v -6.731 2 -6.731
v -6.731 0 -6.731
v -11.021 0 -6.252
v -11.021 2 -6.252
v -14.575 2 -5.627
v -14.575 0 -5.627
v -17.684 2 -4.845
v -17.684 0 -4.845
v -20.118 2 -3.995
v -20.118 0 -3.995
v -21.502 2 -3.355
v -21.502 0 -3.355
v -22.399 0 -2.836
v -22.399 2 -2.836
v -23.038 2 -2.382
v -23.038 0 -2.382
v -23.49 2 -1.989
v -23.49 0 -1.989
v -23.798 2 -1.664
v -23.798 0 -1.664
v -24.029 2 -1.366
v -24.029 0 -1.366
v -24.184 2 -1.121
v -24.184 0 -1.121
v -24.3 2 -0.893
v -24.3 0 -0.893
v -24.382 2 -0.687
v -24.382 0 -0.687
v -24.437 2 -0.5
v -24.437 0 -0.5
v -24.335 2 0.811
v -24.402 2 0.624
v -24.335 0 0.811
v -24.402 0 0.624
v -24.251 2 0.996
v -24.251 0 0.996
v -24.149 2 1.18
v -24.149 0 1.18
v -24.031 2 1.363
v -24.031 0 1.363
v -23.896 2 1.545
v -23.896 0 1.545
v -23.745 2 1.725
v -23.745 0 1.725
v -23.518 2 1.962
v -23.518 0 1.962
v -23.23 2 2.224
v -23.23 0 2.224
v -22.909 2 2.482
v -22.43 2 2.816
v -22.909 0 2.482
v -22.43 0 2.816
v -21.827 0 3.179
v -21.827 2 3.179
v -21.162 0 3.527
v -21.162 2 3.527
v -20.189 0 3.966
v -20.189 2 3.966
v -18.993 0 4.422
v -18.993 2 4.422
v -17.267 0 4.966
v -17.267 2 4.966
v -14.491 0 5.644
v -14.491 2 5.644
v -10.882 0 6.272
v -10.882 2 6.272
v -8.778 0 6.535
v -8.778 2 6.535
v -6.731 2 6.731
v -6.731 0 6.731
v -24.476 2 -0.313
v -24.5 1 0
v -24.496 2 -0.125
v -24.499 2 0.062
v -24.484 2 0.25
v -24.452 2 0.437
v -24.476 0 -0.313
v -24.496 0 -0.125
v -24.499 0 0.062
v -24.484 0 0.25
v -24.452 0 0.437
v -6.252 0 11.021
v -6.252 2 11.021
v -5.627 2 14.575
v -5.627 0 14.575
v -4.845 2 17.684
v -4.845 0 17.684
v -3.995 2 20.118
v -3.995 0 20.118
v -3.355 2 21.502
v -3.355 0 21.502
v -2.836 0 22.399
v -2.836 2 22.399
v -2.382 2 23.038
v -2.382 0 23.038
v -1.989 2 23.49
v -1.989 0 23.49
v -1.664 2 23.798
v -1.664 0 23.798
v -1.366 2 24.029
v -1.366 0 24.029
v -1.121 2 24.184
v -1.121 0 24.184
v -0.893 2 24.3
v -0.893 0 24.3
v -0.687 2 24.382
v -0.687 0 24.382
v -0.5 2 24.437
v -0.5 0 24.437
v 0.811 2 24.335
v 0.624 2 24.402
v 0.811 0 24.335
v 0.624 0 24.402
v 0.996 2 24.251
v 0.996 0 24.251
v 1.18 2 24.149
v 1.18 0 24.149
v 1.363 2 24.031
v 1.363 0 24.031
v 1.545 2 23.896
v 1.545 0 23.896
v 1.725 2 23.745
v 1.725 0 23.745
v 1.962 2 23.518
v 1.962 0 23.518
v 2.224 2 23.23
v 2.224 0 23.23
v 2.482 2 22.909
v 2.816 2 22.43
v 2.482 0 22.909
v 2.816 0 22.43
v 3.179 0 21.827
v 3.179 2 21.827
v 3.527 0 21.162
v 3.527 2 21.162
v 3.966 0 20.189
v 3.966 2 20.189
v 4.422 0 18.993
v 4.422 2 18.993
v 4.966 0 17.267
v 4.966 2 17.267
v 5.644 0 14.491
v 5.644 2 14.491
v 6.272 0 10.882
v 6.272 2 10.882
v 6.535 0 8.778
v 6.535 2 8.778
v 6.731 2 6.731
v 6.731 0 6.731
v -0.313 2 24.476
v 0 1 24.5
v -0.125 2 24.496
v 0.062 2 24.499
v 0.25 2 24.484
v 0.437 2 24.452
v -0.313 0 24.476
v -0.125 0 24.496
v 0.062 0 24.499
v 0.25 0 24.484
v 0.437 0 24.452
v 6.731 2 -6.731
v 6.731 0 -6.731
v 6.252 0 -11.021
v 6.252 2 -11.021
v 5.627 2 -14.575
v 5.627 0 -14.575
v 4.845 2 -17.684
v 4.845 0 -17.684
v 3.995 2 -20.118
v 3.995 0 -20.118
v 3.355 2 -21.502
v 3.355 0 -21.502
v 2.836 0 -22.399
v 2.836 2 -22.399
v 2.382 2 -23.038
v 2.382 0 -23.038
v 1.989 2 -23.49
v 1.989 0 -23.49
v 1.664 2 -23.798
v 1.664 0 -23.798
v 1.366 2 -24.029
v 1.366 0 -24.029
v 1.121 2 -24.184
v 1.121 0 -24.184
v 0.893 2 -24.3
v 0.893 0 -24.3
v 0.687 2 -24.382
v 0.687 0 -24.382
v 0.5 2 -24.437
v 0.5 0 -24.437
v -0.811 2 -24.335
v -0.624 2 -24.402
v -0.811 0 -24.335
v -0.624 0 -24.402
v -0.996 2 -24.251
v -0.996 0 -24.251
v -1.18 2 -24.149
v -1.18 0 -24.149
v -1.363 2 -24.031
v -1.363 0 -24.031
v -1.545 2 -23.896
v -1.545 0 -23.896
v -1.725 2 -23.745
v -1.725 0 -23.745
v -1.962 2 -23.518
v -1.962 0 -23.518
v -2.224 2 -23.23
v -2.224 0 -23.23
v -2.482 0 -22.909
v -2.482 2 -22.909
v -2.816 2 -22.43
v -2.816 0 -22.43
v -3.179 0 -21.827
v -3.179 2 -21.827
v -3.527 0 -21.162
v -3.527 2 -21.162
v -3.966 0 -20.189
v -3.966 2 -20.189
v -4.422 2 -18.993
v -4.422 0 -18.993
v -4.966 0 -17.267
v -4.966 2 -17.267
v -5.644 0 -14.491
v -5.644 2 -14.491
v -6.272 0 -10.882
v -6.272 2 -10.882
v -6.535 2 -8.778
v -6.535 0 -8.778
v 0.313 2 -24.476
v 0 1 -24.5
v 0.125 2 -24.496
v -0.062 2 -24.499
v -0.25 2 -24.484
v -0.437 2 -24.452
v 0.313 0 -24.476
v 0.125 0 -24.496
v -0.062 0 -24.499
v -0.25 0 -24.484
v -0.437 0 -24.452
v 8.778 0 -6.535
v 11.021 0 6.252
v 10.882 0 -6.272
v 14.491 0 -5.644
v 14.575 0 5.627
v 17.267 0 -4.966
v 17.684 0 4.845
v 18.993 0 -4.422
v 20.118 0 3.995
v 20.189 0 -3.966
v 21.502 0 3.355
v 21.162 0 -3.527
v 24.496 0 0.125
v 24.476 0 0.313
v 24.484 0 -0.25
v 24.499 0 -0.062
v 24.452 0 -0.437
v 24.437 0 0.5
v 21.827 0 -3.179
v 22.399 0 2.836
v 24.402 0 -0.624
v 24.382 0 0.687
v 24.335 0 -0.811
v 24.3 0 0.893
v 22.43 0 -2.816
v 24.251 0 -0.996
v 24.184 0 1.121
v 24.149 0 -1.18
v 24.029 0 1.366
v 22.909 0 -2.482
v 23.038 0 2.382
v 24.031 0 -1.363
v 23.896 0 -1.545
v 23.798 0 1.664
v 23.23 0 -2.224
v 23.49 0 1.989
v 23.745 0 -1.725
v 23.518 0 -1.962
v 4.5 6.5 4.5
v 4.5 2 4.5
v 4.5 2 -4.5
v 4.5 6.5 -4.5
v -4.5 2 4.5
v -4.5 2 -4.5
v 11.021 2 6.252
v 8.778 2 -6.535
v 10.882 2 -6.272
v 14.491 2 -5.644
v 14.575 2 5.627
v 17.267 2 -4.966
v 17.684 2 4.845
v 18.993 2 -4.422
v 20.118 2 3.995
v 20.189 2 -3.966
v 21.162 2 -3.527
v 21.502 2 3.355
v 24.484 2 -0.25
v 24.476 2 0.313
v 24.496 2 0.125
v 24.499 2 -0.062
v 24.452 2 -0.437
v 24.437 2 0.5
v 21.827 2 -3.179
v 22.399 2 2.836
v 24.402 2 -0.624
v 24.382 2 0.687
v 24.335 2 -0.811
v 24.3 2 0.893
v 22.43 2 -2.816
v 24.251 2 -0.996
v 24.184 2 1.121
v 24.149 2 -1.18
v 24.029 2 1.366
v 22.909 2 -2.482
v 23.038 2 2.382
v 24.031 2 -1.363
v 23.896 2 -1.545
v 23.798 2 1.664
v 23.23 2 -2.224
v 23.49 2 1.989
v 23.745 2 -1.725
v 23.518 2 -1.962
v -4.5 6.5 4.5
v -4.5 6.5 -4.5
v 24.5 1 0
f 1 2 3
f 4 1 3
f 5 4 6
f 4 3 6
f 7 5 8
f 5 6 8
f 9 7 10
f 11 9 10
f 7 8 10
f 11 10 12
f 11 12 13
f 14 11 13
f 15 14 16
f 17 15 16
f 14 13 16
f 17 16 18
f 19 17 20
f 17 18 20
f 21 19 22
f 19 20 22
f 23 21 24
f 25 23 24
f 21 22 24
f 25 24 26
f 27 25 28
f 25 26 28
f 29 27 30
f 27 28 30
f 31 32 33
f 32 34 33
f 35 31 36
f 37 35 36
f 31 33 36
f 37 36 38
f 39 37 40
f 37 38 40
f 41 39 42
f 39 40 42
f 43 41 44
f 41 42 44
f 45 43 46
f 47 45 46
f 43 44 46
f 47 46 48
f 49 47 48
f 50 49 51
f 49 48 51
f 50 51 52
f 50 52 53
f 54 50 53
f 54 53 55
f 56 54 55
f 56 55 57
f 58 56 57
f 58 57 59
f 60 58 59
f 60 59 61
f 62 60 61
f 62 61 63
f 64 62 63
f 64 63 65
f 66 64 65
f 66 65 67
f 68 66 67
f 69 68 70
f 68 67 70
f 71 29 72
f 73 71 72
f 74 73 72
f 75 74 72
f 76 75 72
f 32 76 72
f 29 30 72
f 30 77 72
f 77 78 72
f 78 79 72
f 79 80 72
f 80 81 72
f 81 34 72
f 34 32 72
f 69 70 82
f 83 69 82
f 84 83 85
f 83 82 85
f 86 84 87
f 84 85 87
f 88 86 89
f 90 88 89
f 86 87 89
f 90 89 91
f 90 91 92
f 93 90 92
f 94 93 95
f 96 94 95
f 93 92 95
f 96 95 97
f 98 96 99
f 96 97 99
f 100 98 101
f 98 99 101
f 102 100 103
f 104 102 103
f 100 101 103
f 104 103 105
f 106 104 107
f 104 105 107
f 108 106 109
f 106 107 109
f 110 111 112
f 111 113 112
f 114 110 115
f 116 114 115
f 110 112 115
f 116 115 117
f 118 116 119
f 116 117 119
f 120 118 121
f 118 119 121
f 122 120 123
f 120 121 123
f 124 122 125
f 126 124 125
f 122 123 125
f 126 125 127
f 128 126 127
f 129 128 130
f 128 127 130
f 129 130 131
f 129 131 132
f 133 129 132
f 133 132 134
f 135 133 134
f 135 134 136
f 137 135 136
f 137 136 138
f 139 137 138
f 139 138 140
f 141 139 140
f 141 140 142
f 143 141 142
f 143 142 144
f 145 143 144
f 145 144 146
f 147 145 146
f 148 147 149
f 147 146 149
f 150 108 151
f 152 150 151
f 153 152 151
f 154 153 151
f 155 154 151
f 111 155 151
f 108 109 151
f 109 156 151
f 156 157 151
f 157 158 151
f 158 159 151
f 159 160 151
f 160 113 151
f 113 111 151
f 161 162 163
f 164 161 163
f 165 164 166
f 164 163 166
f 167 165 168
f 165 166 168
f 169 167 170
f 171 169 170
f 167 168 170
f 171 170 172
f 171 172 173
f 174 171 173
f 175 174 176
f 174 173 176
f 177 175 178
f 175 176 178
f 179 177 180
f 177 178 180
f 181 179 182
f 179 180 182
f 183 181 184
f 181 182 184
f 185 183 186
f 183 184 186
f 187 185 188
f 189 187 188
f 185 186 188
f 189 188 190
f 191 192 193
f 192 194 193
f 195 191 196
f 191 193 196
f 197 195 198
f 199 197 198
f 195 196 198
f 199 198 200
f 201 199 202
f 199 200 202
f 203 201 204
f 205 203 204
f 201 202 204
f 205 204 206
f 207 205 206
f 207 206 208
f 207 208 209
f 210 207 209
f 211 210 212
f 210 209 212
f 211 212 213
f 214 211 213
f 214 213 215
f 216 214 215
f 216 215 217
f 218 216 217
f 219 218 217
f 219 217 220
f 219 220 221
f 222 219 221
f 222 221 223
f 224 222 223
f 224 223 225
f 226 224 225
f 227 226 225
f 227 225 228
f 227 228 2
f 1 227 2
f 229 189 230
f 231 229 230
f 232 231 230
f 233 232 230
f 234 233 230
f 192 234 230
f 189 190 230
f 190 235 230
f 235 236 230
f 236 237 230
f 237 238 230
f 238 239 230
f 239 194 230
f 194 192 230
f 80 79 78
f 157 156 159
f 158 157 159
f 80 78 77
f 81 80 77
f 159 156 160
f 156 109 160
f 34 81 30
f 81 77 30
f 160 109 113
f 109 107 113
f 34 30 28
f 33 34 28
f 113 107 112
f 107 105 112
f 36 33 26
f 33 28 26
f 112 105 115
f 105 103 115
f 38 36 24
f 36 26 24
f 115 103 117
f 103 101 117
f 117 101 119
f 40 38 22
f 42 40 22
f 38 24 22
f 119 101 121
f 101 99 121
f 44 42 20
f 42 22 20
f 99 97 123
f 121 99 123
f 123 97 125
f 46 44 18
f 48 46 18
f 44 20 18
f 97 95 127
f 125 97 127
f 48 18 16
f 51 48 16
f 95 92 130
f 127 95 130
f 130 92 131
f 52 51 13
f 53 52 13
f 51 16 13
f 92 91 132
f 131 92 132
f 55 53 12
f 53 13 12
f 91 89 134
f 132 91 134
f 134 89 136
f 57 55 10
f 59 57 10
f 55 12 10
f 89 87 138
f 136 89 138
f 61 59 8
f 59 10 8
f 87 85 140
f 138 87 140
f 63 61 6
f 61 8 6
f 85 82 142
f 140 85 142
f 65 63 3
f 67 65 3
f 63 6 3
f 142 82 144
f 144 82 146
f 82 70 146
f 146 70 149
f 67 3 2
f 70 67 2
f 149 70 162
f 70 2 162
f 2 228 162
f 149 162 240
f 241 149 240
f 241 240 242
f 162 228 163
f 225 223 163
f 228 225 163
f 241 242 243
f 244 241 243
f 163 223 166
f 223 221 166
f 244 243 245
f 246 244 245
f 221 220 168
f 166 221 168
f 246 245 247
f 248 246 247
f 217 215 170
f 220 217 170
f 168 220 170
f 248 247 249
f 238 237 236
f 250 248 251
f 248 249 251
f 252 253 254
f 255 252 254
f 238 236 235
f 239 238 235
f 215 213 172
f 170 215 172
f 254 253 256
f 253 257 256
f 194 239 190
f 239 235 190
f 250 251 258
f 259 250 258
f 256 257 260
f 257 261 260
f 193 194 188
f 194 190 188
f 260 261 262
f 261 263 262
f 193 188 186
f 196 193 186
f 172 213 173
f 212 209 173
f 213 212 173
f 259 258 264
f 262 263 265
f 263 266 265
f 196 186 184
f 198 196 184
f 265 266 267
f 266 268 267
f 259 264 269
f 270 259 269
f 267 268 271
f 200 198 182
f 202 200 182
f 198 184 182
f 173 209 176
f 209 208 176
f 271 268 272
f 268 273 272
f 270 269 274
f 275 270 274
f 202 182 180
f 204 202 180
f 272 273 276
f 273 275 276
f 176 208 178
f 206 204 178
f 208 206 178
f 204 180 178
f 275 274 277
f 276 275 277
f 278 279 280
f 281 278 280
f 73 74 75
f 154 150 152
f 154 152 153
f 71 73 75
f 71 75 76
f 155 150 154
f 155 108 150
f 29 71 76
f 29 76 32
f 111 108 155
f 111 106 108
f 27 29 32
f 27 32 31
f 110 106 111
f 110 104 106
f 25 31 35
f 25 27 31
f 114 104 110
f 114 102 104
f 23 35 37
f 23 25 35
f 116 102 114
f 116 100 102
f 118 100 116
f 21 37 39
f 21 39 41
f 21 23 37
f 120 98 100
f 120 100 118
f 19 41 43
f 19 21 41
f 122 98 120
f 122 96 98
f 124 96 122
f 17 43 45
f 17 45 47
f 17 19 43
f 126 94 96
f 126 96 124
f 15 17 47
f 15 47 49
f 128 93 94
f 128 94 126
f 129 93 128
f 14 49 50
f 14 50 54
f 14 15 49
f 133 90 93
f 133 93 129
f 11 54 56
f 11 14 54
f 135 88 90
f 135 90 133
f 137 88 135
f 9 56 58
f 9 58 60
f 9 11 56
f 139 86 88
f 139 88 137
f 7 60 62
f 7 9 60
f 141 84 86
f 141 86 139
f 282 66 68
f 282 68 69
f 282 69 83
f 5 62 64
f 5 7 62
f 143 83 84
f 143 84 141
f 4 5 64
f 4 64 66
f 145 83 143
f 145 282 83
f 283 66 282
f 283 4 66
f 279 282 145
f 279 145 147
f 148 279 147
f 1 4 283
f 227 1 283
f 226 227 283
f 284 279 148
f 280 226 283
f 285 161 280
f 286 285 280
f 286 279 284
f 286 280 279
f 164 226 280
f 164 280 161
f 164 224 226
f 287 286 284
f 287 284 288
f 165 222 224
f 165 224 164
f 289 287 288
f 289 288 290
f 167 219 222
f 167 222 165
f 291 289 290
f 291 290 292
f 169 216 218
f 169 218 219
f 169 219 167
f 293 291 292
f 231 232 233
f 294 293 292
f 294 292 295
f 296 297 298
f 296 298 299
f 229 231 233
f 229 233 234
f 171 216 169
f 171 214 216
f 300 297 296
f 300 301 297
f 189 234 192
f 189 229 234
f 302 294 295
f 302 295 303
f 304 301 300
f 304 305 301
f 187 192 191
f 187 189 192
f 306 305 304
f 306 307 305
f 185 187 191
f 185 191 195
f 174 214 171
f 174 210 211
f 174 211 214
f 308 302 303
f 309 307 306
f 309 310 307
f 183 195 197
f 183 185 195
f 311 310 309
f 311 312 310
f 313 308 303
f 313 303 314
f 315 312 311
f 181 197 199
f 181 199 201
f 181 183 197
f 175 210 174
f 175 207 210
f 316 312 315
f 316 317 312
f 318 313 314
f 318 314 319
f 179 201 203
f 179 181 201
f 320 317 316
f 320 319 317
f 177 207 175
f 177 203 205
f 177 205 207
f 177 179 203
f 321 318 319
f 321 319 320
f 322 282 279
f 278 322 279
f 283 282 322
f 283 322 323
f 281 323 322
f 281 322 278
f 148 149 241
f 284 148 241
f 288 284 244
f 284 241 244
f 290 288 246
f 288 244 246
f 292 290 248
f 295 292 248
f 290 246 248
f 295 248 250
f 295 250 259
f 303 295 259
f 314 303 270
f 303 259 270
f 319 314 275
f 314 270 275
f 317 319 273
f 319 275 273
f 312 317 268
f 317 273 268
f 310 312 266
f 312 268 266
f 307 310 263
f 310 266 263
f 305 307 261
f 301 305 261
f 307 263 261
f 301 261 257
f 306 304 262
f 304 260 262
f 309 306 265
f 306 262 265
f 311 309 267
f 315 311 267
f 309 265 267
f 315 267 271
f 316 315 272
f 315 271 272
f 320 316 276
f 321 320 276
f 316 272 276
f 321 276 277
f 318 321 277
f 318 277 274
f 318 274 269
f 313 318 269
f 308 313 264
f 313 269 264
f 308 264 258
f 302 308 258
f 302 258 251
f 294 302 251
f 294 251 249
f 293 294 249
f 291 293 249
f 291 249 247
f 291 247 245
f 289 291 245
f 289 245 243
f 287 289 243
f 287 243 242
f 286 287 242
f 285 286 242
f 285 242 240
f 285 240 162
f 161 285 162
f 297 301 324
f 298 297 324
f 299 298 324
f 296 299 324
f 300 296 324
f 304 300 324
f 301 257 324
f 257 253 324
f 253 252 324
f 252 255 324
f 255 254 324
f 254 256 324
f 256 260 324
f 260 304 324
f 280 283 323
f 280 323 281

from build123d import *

# Parameters (mm, degrees)
BOSS_EXTRUDE1_DEPTH = 2
SKETCH2_W           = 9
SKETCH2_H           = 9
BOSS_EXTRUDE2_DEPTH = 4.5


with BuildPart() as part:
    # Sketch1 → Boss-Extrude1 (new body)
    with BuildSketch(Plane(origin=(0, 0, 0), x_dir=(1, 0, 0), z_dir=(0, 1, 0))):
        with BuildLine():
            add(Edge.make_bspline(
                [(-6.730667633, 6.730667633), (-89.181346144, 0), (-6.730667633, -6.730667633)],
                knots=[4.990688639, 4.990688639, 4.990688639, 7.575681975, 7.575681975, 7.575681975], degree=2, weights=[1, 0.274721128, 1]))
            add(Edge.make_bspline(
                [(-6.730667633, -6.730667633), (0, -89.181346144), (6.730667633, -6.730667633)],
                knots=[4.990688639, 4.990688639, 4.990688639, 7.575681975, 7.575681975, 7.575681975], degree=2, weights=[1, 0.274721128, 1]))
            add(Edge.make_bspline(
                [(6.730667633, -6.730667633), (89.181346144, 0), (6.730667633, 6.730667633)],
                knots=[1.849095986, 1.849095986, 1.849095986, 4.434089321, 4.434089321, 4.434089321], degree=2, weights=[1, 0.274721128, 1]))
            add(Edge.make_bspline(
                [(6.730667633, 6.730667633), (0, 89.181346144), (-6.730667633, 6.730667633)],
                knots=[1.849095986, 1.849095986, 1.849095986, 4.434089321, 4.434089321, 4.434089321], degree=2, weights=[1, 0.274721128, 1]))
        make_face()
    extrude(amount=BOSS_EXTRUDE1_DEPTH)

    # Sketch2 → Boss-Extrude2 (add)
    with BuildSketch(Plane(origin=(0, 2, 0), x_dir=(1, 0, 0), z_dir=(0, 1, 0))):
        Rectangle(SKETCH2_W, SKETCH2_H)
    extrude(amount=BOSS_EXTRUDE2_DEPTH)


solid = part.part
